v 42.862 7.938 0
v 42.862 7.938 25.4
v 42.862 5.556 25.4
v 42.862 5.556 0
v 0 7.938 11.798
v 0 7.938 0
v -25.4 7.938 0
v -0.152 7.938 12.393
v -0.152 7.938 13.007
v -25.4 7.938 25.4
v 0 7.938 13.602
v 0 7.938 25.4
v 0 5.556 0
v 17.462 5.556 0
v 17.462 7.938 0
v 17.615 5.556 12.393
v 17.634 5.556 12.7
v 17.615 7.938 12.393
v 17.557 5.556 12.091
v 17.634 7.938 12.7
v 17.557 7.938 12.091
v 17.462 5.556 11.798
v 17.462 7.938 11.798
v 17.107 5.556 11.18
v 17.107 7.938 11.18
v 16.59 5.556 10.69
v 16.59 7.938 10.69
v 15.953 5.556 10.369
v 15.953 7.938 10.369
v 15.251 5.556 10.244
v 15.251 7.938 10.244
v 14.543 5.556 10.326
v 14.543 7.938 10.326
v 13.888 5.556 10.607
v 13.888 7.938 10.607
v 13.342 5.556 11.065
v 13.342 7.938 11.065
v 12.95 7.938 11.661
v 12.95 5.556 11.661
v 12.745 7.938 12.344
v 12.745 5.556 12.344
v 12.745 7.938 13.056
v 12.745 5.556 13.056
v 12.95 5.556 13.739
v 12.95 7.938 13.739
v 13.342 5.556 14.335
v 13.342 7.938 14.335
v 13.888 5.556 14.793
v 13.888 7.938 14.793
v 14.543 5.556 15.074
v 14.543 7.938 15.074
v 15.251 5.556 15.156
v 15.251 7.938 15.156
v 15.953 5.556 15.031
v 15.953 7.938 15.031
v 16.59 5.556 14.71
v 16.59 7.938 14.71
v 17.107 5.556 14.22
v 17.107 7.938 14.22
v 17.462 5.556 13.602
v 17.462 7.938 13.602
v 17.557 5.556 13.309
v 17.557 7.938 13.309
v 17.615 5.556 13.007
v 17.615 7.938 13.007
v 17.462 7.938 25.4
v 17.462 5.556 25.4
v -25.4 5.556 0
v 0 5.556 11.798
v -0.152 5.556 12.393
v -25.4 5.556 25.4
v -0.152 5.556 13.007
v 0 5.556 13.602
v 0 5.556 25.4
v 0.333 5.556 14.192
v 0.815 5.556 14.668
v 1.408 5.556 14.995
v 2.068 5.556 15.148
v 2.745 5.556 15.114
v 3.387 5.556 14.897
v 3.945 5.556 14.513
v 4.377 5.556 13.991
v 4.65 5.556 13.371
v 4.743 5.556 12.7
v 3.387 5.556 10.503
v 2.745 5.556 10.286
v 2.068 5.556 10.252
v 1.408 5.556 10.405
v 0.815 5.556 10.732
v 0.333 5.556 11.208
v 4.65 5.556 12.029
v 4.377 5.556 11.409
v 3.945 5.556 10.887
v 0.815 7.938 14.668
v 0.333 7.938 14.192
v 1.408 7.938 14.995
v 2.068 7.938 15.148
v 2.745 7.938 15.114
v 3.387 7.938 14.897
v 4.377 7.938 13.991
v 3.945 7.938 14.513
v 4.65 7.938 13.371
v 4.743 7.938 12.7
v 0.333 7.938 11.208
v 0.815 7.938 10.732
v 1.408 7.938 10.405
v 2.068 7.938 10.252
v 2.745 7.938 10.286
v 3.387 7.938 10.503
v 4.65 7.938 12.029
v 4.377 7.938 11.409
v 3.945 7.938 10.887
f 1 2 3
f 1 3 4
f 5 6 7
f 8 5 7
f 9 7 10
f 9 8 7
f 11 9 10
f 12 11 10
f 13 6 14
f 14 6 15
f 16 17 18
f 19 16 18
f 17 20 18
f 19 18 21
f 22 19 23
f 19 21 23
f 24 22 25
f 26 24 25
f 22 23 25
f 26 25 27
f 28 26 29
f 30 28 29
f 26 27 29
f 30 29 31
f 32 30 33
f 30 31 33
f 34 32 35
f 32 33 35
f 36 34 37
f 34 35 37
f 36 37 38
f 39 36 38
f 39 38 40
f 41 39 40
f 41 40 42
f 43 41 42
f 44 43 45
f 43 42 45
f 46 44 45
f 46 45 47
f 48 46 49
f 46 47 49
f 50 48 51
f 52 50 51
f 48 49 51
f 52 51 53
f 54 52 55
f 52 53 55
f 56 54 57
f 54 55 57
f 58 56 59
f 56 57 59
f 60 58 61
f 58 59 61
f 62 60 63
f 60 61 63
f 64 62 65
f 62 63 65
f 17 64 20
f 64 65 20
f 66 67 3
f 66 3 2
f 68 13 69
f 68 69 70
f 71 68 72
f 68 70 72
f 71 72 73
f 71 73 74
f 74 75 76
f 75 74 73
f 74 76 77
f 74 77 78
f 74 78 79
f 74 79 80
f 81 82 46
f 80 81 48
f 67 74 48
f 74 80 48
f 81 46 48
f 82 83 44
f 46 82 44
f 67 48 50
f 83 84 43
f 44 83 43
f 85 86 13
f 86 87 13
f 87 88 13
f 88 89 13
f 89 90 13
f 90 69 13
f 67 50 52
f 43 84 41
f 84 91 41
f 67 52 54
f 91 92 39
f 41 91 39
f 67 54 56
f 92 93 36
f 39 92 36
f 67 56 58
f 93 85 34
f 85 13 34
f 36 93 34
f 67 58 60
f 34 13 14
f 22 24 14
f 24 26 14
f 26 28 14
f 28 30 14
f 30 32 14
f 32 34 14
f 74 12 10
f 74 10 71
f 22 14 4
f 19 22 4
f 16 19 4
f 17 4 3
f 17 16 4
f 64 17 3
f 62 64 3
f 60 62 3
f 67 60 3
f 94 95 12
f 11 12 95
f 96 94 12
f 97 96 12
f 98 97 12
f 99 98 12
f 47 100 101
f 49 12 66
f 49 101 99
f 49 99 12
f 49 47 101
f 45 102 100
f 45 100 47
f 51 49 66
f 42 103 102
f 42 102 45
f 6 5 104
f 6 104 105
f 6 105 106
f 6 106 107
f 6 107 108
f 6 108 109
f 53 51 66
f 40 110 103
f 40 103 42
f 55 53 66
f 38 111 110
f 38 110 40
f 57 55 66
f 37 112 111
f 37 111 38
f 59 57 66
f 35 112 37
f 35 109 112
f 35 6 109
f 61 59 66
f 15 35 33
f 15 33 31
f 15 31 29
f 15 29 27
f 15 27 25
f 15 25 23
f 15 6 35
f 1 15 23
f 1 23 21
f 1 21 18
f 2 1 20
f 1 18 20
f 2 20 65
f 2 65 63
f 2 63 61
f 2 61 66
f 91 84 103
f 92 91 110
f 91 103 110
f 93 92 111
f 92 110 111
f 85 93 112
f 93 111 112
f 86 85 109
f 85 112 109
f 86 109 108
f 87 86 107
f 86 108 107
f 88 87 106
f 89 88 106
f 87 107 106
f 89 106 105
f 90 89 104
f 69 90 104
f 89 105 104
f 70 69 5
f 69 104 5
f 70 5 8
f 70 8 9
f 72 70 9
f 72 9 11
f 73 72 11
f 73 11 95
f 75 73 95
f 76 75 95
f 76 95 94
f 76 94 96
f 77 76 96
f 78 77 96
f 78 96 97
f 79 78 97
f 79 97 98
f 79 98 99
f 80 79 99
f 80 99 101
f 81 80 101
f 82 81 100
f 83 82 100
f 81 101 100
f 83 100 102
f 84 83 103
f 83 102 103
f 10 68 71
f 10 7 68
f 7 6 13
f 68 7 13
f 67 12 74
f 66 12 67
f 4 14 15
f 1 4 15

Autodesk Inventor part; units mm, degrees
ref_plane "YZ Plane" through (0, 0, 0) normal (1, 0, 0) x (0, 1, 0)
ref_plane "XZ Plane" through (0, 0, 0) normal (0, 1, 0) x (-1, 0, 0)
sketch "Sketch1" plane through (0, 0, 0) normal (0, 0, 1) x (1, 0, 0)
  line L0 (0, 0) -> (4.7625, 0)
  line L1 (4.7625, 3.1115) -> (3.9687, 3.1115) construction
  line L2 (0, 3.1115) -> (0, 0)
  line L3 (4.7625, 0) -> (12.7, 0)
  line L4 (12.7, 0) -> (12.7, 3.1115) construction
  line L5 (12.7, 5.1753) -> (11.1125, 5.1753) construction
  line L6 (4.7625, 5.1753) -> (4.7625, 3.1115) construction
  line L7 (2.3812, 3.1115) -> (2.3812, 0) construction
  line L8 (8.7312, 5.1753) -> (8.7312, 0) construction
  line L9 (2.3812, 3.1115) -> (2.3812, 5.4927) construction
  circle A0 centre (2.3812, 5.4927) radius 2.3812 construction
  line L10 (6.35, 5.1753) -> (6.35, 0) construction
  line L11 (11.1125, 5.1753) -> (11.1125, 0) construction
  line L12 (4.7625, 3.1115) -> (12.7, 3.1115) construction
  line L13 (6.35, 5.1753) -> (4.7625, 5.1753) construction
  line L14 (4.7625, 3.1115) -> (4.7625, 0) construction
  line L15 (11.1125, 5.1753) -> (10.3187, 5.1753) construction
  line L16 (12.7, 3.1115) -> (12.7, 5.1753) construction
  line L17 (8.7312, 5.1753) -> (8.7312, 7.5565) construction
  circle A1 centre (8.7312, 7.5565) radius 2.3813 construction
  line L18 (0.7937, 3.1115) -> (0.7937, 0)
  line L19 (3.9687, 3.1115) -> (3.9687, 0)
  line L20 (7.1437, 5.1753) -> (7.1437, 0)
  line L21 (10.3187, 5.1753) -> (10.3187, 0)
  line L22 (3.9687, 3.1115) -> (0.7937, 3.1115)
  line L23 (0.7937, 3.1115) -> (0, 3.1115)
  line L24 (10.3187, 5.1753) -> (8.7312, 5.1753)
  line L25 (7.1437, 5.1753) -> (6.35, 5.1753) construction
  line L26 (8.7312, 5.1753) -> (7.1437, 5.1753)
  line L27 (3.9687, 3.1115) -> (7.1437, 5.1753)
  line L28 (0, 0) -> (0, 5.5563) construction
  line L29 (0, 5.5563) -> (17.4625, 5.5563)
  line L30 (0, 5.5563) -> (0, 7.9375)
  line L31 (0, 7.9375) -> (17.4625, 7.9375)
  line L32 (12.7, 3.1115) -> (13.4937, 3.1115) construction
  line L33 (12.7, 0) -> (17.4625, 0)
  line L34 (17.4625, 0) -> (17.4625, 3.1115)
  line L35 (15.0812, 0) -> (15.0812, 3.1115) construction
  line L36 (13.4937, 3.1115) -> (13.4937, 0)
  line L37 (16.6687, 3.1115) -> (16.6687, 0)
  line L38 (13.4937, 3.1115) -> (15.0812, 3.1115)
  line L39 (16.6687, 3.1115) -> (17.4625, 3.1115)
  line L40 (15.0812, 3.1115) -> (16.6687, 3.1115)
  line L41 (15.0812, 3.1115) -> (15.0812, 5.4928) construction
  circle A2 centre (15.0812, 5.4928) radius 2.3813 construction
  line L42 (10.3187, 5.1753) -> (13.4937, 3.1115)
  line L43 (0, -12.7) -> (0, 0) construction
  line L44 (0, -7.1437) -> (26.1938, -7.1437) construction
  line L45 (0, -4.7625) -> (26.1938, -4.7625) construction
  line L46 (26.1938, -4.7625) -> (26.1938, -7.1437) construction
  line L47 (26.1938, -7.1437) -> (26.1938, -12.7) construction
  line L48 (26.1938, -12.7) -> (0, -12.7) construction
  line L49 (26.1938, -6.35) -> (34.3852, -6.35) construction
  line L50 (26.1938, -12.7) -> (34.3852, -12.7) construction
  line L51 (34.3852, -12.7) -> (34.3852, -6.35) construction
  line L52 (16.6688, -4.7625) -> (16.6688, -12.7) construction
  circle A3 centre (16.6688, -5.1435) radius 2.3813 construction
  circle A4 centre (16.6688, -7.2073) radius 2.3813 construction
  circle A5 centre (10.3187, -5.1435) radius 2.3813 construction
  circle A6 centre (10.3187, -7.2073) radius 2.3813 construction
  line L53 (10.3187, -4.7625) -> (10.3187, -12.7) construction
  line L54 (0, -7.5248) -> (26.1938, -7.5248) construction
  line L55 (8.7312, -7.5248) -> (8.7312, -12.7) construction
  line L56 (5.5562, -7.5248) -> (5.5562, -12.7) construction
  line L57 (18.2563, -7.5248) -> (18.2563, -12.7) construction
  line L58 (21.4313, -7.5248) -> (21.4313, -12.7) construction
  line L59 (0, -9.5885) -> (26.1938, -9.5885) construction
  line L60 (5.5562, -9.5885) -> (8.7312, -7.5248) construction
  line L61 (18.2563, -7.5248) -> (21.4312, -9.5885) construction
  line L62 (11.9062, -7.5248) -> (11.9062, -12.7) construction
  line L63 (15.0812, -7.5248) -> (15.0812, -12.7) construction
  line L64 (11.9062, -7.5248) -> (15.0812, -9.5885) construction
  line L65 (21.4313, -9.3266) -> (34.3852, -9.3266) construction
  line L66 (24.6063, -9.3266) -> (24.6063, -12.7) construction
  line L67 (21.4313, -9.3266) -> (20.1197, -7.1437) construction
  line L68 (26.1938, -9.5885) -> (30.9563, -9.5885) construction
  line L69 (30.9563, -9.5885) -> (30.9563, -12.7) construction
  line L70 (31.75, -9.3266) -> (31.75, -12.7) construction
  line L71 (31.75, -12.7) -> (29.723, -9.3266) construction
  line L72 (0, -4.7625) -> (-1.5875, -4.7625) construction
  line L73 (-1.5875, -4.7625) -> (-1.5875, -9.3266) construction
  line L74 (-1.5875, -9.3266) -> (5.5562, -9.3266) construction
  line L75 (1.4233, 7.874) -> (3.7622, 7.874)
  line L76 (17.4625, 5.5563) -> (17.4625, 7.9375)
  dimension "d8" = 6.35
  dimension "d9" = 5.1753
  dimension "d10" = 4.7625
  dimension "d11" = 2.3813
  dimension "d12" = 3.175
  dimension "d13" = 3.175
  dimension "d14" = 4.7625
  dimension "d15" = 2.3813
  dimension "d16" = 3.1115
  dimension "d17" = 5.5563
  dimension "d18" = 7.9375
  dimension "d19" = 6.35
  dimension "d20" = 3.175
  dimension "d21" = 2.3813
  dimension "d25" = 12.7
  dimension "d26" = 5.5563
  dimension "d27" = 7.9375
  dimension "d28" = 26.1938
  dimension "d29" = 8.1915
  dimension "d30" = 6.35
  dimension "d33" = 9.525
  dimension "d35" = 0.381
  dimension "d36" = 0.0635
  dimension "d38" = 6.35
  dimension "d39" = 0.381
  dimension "d40" = 0.381
  dimension "d41" = 0.0635
  dimension "d42" = 0.0635
  dimension "d43" = 9.525
  dimension "d46" = 1.5875
  dimension "d47" = 4.7625
  dimension "d48" = 1.5875
  dimension "d49" = 4.7625
  dimension "d50" = 3.1115
  dimension "d51" = 1.5875
  dimension "d52" = 4.7625
  dimension "d53" = 3.3734
  dimension "d54" = 3.175
  dimension "d55" = 31
  dimension "d56" = 9.525
  dimension "d57" = 9.525
  dimension "d59" = 0.7937
  dimension "d60" = 31
  dimension "d61" = 1.5875
  dimension "d62" = 3.3734
  dimension "d63" = 0.0635
extrude "Extrusion1" add sketch "Sketch1" along normal blind 25.4 contours L30 L31 L76 L29
sketch "Sketch2" plane through (17.4625, 5.5563, 0) normal (1, 0, 0) x (0, 0, -1)
  line L0 (0, 0) -> (0, 2.3813) projected
  line L1 (0, 2.3813) -> (-25.4, 2.3813) projected
  line L2 (-25.4, 0) -> (-25.4, 2.3813) projected
  line L3 (0, 0) -> (-25.4, 0) projected
  point P0 (0, -5.5562)
extrude "Extrusion3" add sketch "Sketch2" along normal blind 25.4
sketch "Sketch4" plane through (0, 5.5563, 0) normal (-1, 0, 0) x (0, 0, 1)
  line L0 (0, 2.3812) -> (0, 0) projected
  line L1 (0, 0) -> (25.4, 0) projected
  line L2 (25.4, 2.3812) -> (25.4, 0) projected
  line L3 (0, 2.3812) -> (25.4, 2.3812) projected
  point P0 (0, -5.5563)
extrude "Extrusion4" add sketch "Sketch4" along normal blind 25.4
sketch "Sketch3" plane through (0, 7.9375, 0) normal (0, 1, 0) x (1, 0, 0)
  line L0 (0, 0) -> (0, -25.4) projected
  line L1 (17.4625, 0) -> (17.4625, -25.4) projected
  circle A0 centre (2.286, -12.7) radius 2.4574
  circle A1 centre (15.1765, -12.7) radius 2.4574
  line L2 (0, -12.7) -> (17.4625, -12.7) construction
  dimension "d66" = 4.9149
  dimension "d67" = 12.8905
  dimension "d68" = 2.286
  dimension "d69" = 2.286
extrude "Extrusion2" cut sketch "Sketch3" against normal blind 25.4
ref_plane "Work Plane1" through (42.8625, 0, 0) normal (0, -1, 0) x (1, 0, 0)
equation "\"d19\" = d8"
equation "\"d26\" = d17"
equation "\"d27\" = d18"
equation "\"d39\" = d35"
equation "\"d40\" = d39"
equation "\"d41\" = d36"
equation "\"d42\" = d41"
equation "\"d50\" = d16"
equation "\"d51\" = d46"
equation "\"d52\" = d47"
equation "\"d57\" = d56"
equation "\"d60\" = d55"
equation "\"d62\" = d53"
equation "\"d68\" = d69"
properties part number "Sketch - Ball Shifting Shaft"
